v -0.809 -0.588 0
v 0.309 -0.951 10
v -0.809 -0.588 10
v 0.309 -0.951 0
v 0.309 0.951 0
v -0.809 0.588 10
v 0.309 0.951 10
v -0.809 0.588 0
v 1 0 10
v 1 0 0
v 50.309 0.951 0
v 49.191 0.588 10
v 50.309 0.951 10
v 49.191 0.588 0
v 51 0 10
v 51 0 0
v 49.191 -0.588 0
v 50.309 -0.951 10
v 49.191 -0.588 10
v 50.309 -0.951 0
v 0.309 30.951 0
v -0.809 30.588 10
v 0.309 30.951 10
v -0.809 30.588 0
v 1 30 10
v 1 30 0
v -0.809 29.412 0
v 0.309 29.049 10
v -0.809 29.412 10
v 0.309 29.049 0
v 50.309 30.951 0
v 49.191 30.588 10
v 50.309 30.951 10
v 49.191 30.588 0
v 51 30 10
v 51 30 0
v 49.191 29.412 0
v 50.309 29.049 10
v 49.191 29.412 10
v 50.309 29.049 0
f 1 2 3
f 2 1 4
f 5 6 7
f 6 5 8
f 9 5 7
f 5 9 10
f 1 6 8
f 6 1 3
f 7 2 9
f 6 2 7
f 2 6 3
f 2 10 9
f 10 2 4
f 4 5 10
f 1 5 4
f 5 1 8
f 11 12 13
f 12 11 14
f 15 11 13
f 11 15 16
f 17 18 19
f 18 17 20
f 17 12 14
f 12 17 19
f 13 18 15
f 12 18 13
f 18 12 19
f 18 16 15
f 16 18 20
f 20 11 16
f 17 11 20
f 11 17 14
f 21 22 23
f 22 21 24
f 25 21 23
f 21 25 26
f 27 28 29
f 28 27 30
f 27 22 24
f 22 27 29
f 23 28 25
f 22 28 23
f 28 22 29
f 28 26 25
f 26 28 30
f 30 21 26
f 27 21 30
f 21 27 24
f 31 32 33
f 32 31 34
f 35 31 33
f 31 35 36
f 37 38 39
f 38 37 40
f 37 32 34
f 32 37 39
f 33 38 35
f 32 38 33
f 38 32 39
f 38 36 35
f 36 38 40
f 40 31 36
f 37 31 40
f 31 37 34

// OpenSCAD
// file: ../math/vect.scad
function vect_scalar_sum(v, incr) = [for (i = [0: len(v) - 1]) v[i] + incr];

function vSize(size) = (!is_list(size)) ? [size, size, size]: size; 


function vect_2d_to_3d(vect, z = 0) = [vect[0], vect[1], z];

function vect_rotate2d(vect, b) = [
    cos(b) * vect[0] - sin(b) * vect[1],
    sin(b) * vect[0] + cos(b) * vect[1]
];

function round_vect(v) = [for (i = [0: len(v) - 1]) round(v[i])];

function vect_swap_xy(v1) = [v1.y, v1.x, v1.z];

function vectorize_2(x) = is_list(x) ? [x.x, x.y] : [x, x];

function vectorize_3(x) = is_list(x) ? [x.x, x.y, x.z] : [x, x, x];

echo (vectorize_3(1));
// file: ../math/align.scad
use <vect.scad>
module align_center(sizes, center = true, centerZ = false, vector=[1, 1, 0]){
    xxx=vector.x;
    yyy=vector.y;
    zzz=centerZ || vector.z;
    sizes = vSize(sizes);
    if (center){
        translate([xxx ? -sizes[0] / 2 : 0, yyy ? -sizes[1] / 2: 0, zzz ? -sizes[2]/2 : 0]){
            children();
        }
    } else {
        children();
    }   
}

module align_uncenter(sizes, uncenter = true, uncenterZ = false){
    sizes = vSize(sizes);
    if (uncenter){
        translate([sizes[0] / 2, sizes[1] / 2, (uncenterZ ? sizes[2]/2 : 0)]){
            children();
        }
    } else {
        children();
    }   
}

ALIGN_LEFT=[1, 0, 0];
ALIGN_RIGHT=[-1, 0, 0];
ALIGN_BOTTOM=[0, 0, -1];
ALIGN_TOP=[0, 0, 1];
ALIGN_BACK=[0, -1, 0];
ALIGN_FWD=[0, 1, 0];

function _aligner(target, source, align) = 
            align > 0 ? target * align:
            align < 0 ? source * align:
            (target - source) / 2;    

function aligner(target_sizes, source_sizes, vector) = [
    vector.x == undef ? 0 : _aligner(target_sizes.x, source_sizes.x, vector.x),
    vector.y == undef ? 0 : _aligner(target_sizes.y, source_sizes.y, vector.y),
    vector.z == undef ? 0 : _aligner(target_sizes.z, source_sizes.z, vector.z)
];

module align_relative(
    target_sizes, 
    source_sizes, 
    vector=[0,0,undef]
    ){
        
    // x = vector.x == undef ? 0 : _aligner(target_sizes.y, source_sizes.x, vector.x);
    // y = vector.y == undef ? 0 : _aligner(target_sizes.y, source_sizes.y, vector.y);
    // z = vector.z == undef ? 0 : _aligner(target_sizes.z, source_sizes.z, vector.z);
    to_translate = aligner(target_sizes, source_sizes, vector);
    echo(to_translate);
    translate(to_translate)
        children();
}

module align_center_source_vs_target(target_sizes, source_sizes, centerZ = false){
    align_relative(target_sizes=target_sizes, source_sizes=source_sizes, vector=[0, 0, centerZ ? 1 : 0])
        children();
}


module zz(z){
    translate([0, 0, z])
        children();
}

module xx(x){
    translate([x, 0, 0])
        children();
}

module yy(y){
    translate([0, y, 0])
        children();
}

module rz(z){
    rotate([0, 0, z])
        children();
}

module rx(x){
    rotate([x, 0, 0])
        children();
}

module ry(y){
    rotate([0, y, 0])
        children();
}

module zc(){
    translate([0, 0, -0.01])
        children();
}
module xc(){
    translate([-0.01, 0, 0])    
        children();
}
module yc(){
    translate([0, -0.01, 0])
        children();
}

// align_center_source_vs_target([100, 100, 1], [10, 10, 10], centerZ = false){
//     cube([100,100,1]);
//     cube([10,10,10]);
// }

// align_center(20){
//     align_uncenter(20){
//         cube(20);
//     }
// }

// target_sizes = [20, 20, 20];
// source_sizes = [10, 10, 10];
// color("azure",0.25)
//     cube(size=target_sizes);
// align_relative(target_sizes=target_sizes, source_sizes=source_sizes, vector=[0, 0, undef]){
//     color("red",0.25)
//         zz(20)
//         cube(size=source_sizes);
// }
// file: screw_holes.scad
use <../math/align.scad>

module screw_hole(d, h, chamferD = undef, chamferA = 30, mirrorZ = false){
    chamferD = is_undef(chamferD) ? d * 1.75: chamferD;
    chamferH = chamferD * tan(chamferA);

    module _m(){
        cylinder(d = d, h = h);
        zz(h - chamferH)
        cylinder(r2 = chamferD / 2, r1 = 0,  h = chamferH);
    }

    if (mirrorZ){
        translate([0, 0, h]) mirror([0, 0, 1]) 
            _m();
    } else {
        _m();
    }
}


module screw_holes(size, d, positions=[1,1,1,1], chamferD = undef, chamferA = 30){
    module _h(){
        screw_hole(d = d, h = size.z, chamferD, chamferA);
    }
    if (positions[0])
        xx(size.x)
            _h();
    if (positions[1])
        yy(size.y)
            _h();
    if (positions[2])
        yy(size.y)
        xx(size.x)
            _h();
    if (positions[3])
        _h();
}

module four_screw_holes(size, d, chamferD = undef, chamferA = 30){
    module _h(){
        screw_hole(d = d, h = size.z, chamferD, chamferA);
    }
    xx(size.x)
        _h();
    yy(size.y)
        _h();
    yy(size.y)
    xx(size.x)
        _h();
    _h();
}

$fn=100;
screw_hole(3, 5);
//four_screw_holes([100, 100, 10], 10, 15);
// main file
use <screw_holes.scad>
use <../math/align.scad>

module screw_stand(d, screwD, screwH, h,  chamferD = undef, chamferA = 0, mirrorZ = false){
    screwH = is_undef(screwH) ? h : screwH;

    assert(screwH != undef);

    difference() {
        cylinder(h = h, d = d);
        translate([0, 0, 0.01]) screw_hole(d = screwD, chamferA = chamferA, chamferD = chamferD, h = screwH);
    }
}


module screw_stands(size, d, screwD, screwH = 3, positions=[1,1,1,1], chamferD = undef, chamferA = 0, center = false){
    assert (size != undef);
    assert (size.x != undef);
    assert (size.y != undef);
    assert (size.z != undef);
    assert (d != undef);
    assert (screwD != undef);
    assert (positions != undef);


    module main(){
        module _h(){
            screw_stand(d = d, screwD = screwD, screwH= screwH, h = size.z, chamferD, chamferA);
        }
        if (positions[0])
            xx(size.x)
                _h();
        if (positions[1])
            yy(size.y)
                _h();
        if (positions[2])
            yy(size.y)
            xx(size.x)
                _h();
        if (positions[3])
            _h();
    }
    if (center)
        xx(- size.x / 2) yy(- size.y / 2) main();
    else
        main();
}


screw_stands([50, 30, 10], d = 6, screwD = 3, screwH = 20);
